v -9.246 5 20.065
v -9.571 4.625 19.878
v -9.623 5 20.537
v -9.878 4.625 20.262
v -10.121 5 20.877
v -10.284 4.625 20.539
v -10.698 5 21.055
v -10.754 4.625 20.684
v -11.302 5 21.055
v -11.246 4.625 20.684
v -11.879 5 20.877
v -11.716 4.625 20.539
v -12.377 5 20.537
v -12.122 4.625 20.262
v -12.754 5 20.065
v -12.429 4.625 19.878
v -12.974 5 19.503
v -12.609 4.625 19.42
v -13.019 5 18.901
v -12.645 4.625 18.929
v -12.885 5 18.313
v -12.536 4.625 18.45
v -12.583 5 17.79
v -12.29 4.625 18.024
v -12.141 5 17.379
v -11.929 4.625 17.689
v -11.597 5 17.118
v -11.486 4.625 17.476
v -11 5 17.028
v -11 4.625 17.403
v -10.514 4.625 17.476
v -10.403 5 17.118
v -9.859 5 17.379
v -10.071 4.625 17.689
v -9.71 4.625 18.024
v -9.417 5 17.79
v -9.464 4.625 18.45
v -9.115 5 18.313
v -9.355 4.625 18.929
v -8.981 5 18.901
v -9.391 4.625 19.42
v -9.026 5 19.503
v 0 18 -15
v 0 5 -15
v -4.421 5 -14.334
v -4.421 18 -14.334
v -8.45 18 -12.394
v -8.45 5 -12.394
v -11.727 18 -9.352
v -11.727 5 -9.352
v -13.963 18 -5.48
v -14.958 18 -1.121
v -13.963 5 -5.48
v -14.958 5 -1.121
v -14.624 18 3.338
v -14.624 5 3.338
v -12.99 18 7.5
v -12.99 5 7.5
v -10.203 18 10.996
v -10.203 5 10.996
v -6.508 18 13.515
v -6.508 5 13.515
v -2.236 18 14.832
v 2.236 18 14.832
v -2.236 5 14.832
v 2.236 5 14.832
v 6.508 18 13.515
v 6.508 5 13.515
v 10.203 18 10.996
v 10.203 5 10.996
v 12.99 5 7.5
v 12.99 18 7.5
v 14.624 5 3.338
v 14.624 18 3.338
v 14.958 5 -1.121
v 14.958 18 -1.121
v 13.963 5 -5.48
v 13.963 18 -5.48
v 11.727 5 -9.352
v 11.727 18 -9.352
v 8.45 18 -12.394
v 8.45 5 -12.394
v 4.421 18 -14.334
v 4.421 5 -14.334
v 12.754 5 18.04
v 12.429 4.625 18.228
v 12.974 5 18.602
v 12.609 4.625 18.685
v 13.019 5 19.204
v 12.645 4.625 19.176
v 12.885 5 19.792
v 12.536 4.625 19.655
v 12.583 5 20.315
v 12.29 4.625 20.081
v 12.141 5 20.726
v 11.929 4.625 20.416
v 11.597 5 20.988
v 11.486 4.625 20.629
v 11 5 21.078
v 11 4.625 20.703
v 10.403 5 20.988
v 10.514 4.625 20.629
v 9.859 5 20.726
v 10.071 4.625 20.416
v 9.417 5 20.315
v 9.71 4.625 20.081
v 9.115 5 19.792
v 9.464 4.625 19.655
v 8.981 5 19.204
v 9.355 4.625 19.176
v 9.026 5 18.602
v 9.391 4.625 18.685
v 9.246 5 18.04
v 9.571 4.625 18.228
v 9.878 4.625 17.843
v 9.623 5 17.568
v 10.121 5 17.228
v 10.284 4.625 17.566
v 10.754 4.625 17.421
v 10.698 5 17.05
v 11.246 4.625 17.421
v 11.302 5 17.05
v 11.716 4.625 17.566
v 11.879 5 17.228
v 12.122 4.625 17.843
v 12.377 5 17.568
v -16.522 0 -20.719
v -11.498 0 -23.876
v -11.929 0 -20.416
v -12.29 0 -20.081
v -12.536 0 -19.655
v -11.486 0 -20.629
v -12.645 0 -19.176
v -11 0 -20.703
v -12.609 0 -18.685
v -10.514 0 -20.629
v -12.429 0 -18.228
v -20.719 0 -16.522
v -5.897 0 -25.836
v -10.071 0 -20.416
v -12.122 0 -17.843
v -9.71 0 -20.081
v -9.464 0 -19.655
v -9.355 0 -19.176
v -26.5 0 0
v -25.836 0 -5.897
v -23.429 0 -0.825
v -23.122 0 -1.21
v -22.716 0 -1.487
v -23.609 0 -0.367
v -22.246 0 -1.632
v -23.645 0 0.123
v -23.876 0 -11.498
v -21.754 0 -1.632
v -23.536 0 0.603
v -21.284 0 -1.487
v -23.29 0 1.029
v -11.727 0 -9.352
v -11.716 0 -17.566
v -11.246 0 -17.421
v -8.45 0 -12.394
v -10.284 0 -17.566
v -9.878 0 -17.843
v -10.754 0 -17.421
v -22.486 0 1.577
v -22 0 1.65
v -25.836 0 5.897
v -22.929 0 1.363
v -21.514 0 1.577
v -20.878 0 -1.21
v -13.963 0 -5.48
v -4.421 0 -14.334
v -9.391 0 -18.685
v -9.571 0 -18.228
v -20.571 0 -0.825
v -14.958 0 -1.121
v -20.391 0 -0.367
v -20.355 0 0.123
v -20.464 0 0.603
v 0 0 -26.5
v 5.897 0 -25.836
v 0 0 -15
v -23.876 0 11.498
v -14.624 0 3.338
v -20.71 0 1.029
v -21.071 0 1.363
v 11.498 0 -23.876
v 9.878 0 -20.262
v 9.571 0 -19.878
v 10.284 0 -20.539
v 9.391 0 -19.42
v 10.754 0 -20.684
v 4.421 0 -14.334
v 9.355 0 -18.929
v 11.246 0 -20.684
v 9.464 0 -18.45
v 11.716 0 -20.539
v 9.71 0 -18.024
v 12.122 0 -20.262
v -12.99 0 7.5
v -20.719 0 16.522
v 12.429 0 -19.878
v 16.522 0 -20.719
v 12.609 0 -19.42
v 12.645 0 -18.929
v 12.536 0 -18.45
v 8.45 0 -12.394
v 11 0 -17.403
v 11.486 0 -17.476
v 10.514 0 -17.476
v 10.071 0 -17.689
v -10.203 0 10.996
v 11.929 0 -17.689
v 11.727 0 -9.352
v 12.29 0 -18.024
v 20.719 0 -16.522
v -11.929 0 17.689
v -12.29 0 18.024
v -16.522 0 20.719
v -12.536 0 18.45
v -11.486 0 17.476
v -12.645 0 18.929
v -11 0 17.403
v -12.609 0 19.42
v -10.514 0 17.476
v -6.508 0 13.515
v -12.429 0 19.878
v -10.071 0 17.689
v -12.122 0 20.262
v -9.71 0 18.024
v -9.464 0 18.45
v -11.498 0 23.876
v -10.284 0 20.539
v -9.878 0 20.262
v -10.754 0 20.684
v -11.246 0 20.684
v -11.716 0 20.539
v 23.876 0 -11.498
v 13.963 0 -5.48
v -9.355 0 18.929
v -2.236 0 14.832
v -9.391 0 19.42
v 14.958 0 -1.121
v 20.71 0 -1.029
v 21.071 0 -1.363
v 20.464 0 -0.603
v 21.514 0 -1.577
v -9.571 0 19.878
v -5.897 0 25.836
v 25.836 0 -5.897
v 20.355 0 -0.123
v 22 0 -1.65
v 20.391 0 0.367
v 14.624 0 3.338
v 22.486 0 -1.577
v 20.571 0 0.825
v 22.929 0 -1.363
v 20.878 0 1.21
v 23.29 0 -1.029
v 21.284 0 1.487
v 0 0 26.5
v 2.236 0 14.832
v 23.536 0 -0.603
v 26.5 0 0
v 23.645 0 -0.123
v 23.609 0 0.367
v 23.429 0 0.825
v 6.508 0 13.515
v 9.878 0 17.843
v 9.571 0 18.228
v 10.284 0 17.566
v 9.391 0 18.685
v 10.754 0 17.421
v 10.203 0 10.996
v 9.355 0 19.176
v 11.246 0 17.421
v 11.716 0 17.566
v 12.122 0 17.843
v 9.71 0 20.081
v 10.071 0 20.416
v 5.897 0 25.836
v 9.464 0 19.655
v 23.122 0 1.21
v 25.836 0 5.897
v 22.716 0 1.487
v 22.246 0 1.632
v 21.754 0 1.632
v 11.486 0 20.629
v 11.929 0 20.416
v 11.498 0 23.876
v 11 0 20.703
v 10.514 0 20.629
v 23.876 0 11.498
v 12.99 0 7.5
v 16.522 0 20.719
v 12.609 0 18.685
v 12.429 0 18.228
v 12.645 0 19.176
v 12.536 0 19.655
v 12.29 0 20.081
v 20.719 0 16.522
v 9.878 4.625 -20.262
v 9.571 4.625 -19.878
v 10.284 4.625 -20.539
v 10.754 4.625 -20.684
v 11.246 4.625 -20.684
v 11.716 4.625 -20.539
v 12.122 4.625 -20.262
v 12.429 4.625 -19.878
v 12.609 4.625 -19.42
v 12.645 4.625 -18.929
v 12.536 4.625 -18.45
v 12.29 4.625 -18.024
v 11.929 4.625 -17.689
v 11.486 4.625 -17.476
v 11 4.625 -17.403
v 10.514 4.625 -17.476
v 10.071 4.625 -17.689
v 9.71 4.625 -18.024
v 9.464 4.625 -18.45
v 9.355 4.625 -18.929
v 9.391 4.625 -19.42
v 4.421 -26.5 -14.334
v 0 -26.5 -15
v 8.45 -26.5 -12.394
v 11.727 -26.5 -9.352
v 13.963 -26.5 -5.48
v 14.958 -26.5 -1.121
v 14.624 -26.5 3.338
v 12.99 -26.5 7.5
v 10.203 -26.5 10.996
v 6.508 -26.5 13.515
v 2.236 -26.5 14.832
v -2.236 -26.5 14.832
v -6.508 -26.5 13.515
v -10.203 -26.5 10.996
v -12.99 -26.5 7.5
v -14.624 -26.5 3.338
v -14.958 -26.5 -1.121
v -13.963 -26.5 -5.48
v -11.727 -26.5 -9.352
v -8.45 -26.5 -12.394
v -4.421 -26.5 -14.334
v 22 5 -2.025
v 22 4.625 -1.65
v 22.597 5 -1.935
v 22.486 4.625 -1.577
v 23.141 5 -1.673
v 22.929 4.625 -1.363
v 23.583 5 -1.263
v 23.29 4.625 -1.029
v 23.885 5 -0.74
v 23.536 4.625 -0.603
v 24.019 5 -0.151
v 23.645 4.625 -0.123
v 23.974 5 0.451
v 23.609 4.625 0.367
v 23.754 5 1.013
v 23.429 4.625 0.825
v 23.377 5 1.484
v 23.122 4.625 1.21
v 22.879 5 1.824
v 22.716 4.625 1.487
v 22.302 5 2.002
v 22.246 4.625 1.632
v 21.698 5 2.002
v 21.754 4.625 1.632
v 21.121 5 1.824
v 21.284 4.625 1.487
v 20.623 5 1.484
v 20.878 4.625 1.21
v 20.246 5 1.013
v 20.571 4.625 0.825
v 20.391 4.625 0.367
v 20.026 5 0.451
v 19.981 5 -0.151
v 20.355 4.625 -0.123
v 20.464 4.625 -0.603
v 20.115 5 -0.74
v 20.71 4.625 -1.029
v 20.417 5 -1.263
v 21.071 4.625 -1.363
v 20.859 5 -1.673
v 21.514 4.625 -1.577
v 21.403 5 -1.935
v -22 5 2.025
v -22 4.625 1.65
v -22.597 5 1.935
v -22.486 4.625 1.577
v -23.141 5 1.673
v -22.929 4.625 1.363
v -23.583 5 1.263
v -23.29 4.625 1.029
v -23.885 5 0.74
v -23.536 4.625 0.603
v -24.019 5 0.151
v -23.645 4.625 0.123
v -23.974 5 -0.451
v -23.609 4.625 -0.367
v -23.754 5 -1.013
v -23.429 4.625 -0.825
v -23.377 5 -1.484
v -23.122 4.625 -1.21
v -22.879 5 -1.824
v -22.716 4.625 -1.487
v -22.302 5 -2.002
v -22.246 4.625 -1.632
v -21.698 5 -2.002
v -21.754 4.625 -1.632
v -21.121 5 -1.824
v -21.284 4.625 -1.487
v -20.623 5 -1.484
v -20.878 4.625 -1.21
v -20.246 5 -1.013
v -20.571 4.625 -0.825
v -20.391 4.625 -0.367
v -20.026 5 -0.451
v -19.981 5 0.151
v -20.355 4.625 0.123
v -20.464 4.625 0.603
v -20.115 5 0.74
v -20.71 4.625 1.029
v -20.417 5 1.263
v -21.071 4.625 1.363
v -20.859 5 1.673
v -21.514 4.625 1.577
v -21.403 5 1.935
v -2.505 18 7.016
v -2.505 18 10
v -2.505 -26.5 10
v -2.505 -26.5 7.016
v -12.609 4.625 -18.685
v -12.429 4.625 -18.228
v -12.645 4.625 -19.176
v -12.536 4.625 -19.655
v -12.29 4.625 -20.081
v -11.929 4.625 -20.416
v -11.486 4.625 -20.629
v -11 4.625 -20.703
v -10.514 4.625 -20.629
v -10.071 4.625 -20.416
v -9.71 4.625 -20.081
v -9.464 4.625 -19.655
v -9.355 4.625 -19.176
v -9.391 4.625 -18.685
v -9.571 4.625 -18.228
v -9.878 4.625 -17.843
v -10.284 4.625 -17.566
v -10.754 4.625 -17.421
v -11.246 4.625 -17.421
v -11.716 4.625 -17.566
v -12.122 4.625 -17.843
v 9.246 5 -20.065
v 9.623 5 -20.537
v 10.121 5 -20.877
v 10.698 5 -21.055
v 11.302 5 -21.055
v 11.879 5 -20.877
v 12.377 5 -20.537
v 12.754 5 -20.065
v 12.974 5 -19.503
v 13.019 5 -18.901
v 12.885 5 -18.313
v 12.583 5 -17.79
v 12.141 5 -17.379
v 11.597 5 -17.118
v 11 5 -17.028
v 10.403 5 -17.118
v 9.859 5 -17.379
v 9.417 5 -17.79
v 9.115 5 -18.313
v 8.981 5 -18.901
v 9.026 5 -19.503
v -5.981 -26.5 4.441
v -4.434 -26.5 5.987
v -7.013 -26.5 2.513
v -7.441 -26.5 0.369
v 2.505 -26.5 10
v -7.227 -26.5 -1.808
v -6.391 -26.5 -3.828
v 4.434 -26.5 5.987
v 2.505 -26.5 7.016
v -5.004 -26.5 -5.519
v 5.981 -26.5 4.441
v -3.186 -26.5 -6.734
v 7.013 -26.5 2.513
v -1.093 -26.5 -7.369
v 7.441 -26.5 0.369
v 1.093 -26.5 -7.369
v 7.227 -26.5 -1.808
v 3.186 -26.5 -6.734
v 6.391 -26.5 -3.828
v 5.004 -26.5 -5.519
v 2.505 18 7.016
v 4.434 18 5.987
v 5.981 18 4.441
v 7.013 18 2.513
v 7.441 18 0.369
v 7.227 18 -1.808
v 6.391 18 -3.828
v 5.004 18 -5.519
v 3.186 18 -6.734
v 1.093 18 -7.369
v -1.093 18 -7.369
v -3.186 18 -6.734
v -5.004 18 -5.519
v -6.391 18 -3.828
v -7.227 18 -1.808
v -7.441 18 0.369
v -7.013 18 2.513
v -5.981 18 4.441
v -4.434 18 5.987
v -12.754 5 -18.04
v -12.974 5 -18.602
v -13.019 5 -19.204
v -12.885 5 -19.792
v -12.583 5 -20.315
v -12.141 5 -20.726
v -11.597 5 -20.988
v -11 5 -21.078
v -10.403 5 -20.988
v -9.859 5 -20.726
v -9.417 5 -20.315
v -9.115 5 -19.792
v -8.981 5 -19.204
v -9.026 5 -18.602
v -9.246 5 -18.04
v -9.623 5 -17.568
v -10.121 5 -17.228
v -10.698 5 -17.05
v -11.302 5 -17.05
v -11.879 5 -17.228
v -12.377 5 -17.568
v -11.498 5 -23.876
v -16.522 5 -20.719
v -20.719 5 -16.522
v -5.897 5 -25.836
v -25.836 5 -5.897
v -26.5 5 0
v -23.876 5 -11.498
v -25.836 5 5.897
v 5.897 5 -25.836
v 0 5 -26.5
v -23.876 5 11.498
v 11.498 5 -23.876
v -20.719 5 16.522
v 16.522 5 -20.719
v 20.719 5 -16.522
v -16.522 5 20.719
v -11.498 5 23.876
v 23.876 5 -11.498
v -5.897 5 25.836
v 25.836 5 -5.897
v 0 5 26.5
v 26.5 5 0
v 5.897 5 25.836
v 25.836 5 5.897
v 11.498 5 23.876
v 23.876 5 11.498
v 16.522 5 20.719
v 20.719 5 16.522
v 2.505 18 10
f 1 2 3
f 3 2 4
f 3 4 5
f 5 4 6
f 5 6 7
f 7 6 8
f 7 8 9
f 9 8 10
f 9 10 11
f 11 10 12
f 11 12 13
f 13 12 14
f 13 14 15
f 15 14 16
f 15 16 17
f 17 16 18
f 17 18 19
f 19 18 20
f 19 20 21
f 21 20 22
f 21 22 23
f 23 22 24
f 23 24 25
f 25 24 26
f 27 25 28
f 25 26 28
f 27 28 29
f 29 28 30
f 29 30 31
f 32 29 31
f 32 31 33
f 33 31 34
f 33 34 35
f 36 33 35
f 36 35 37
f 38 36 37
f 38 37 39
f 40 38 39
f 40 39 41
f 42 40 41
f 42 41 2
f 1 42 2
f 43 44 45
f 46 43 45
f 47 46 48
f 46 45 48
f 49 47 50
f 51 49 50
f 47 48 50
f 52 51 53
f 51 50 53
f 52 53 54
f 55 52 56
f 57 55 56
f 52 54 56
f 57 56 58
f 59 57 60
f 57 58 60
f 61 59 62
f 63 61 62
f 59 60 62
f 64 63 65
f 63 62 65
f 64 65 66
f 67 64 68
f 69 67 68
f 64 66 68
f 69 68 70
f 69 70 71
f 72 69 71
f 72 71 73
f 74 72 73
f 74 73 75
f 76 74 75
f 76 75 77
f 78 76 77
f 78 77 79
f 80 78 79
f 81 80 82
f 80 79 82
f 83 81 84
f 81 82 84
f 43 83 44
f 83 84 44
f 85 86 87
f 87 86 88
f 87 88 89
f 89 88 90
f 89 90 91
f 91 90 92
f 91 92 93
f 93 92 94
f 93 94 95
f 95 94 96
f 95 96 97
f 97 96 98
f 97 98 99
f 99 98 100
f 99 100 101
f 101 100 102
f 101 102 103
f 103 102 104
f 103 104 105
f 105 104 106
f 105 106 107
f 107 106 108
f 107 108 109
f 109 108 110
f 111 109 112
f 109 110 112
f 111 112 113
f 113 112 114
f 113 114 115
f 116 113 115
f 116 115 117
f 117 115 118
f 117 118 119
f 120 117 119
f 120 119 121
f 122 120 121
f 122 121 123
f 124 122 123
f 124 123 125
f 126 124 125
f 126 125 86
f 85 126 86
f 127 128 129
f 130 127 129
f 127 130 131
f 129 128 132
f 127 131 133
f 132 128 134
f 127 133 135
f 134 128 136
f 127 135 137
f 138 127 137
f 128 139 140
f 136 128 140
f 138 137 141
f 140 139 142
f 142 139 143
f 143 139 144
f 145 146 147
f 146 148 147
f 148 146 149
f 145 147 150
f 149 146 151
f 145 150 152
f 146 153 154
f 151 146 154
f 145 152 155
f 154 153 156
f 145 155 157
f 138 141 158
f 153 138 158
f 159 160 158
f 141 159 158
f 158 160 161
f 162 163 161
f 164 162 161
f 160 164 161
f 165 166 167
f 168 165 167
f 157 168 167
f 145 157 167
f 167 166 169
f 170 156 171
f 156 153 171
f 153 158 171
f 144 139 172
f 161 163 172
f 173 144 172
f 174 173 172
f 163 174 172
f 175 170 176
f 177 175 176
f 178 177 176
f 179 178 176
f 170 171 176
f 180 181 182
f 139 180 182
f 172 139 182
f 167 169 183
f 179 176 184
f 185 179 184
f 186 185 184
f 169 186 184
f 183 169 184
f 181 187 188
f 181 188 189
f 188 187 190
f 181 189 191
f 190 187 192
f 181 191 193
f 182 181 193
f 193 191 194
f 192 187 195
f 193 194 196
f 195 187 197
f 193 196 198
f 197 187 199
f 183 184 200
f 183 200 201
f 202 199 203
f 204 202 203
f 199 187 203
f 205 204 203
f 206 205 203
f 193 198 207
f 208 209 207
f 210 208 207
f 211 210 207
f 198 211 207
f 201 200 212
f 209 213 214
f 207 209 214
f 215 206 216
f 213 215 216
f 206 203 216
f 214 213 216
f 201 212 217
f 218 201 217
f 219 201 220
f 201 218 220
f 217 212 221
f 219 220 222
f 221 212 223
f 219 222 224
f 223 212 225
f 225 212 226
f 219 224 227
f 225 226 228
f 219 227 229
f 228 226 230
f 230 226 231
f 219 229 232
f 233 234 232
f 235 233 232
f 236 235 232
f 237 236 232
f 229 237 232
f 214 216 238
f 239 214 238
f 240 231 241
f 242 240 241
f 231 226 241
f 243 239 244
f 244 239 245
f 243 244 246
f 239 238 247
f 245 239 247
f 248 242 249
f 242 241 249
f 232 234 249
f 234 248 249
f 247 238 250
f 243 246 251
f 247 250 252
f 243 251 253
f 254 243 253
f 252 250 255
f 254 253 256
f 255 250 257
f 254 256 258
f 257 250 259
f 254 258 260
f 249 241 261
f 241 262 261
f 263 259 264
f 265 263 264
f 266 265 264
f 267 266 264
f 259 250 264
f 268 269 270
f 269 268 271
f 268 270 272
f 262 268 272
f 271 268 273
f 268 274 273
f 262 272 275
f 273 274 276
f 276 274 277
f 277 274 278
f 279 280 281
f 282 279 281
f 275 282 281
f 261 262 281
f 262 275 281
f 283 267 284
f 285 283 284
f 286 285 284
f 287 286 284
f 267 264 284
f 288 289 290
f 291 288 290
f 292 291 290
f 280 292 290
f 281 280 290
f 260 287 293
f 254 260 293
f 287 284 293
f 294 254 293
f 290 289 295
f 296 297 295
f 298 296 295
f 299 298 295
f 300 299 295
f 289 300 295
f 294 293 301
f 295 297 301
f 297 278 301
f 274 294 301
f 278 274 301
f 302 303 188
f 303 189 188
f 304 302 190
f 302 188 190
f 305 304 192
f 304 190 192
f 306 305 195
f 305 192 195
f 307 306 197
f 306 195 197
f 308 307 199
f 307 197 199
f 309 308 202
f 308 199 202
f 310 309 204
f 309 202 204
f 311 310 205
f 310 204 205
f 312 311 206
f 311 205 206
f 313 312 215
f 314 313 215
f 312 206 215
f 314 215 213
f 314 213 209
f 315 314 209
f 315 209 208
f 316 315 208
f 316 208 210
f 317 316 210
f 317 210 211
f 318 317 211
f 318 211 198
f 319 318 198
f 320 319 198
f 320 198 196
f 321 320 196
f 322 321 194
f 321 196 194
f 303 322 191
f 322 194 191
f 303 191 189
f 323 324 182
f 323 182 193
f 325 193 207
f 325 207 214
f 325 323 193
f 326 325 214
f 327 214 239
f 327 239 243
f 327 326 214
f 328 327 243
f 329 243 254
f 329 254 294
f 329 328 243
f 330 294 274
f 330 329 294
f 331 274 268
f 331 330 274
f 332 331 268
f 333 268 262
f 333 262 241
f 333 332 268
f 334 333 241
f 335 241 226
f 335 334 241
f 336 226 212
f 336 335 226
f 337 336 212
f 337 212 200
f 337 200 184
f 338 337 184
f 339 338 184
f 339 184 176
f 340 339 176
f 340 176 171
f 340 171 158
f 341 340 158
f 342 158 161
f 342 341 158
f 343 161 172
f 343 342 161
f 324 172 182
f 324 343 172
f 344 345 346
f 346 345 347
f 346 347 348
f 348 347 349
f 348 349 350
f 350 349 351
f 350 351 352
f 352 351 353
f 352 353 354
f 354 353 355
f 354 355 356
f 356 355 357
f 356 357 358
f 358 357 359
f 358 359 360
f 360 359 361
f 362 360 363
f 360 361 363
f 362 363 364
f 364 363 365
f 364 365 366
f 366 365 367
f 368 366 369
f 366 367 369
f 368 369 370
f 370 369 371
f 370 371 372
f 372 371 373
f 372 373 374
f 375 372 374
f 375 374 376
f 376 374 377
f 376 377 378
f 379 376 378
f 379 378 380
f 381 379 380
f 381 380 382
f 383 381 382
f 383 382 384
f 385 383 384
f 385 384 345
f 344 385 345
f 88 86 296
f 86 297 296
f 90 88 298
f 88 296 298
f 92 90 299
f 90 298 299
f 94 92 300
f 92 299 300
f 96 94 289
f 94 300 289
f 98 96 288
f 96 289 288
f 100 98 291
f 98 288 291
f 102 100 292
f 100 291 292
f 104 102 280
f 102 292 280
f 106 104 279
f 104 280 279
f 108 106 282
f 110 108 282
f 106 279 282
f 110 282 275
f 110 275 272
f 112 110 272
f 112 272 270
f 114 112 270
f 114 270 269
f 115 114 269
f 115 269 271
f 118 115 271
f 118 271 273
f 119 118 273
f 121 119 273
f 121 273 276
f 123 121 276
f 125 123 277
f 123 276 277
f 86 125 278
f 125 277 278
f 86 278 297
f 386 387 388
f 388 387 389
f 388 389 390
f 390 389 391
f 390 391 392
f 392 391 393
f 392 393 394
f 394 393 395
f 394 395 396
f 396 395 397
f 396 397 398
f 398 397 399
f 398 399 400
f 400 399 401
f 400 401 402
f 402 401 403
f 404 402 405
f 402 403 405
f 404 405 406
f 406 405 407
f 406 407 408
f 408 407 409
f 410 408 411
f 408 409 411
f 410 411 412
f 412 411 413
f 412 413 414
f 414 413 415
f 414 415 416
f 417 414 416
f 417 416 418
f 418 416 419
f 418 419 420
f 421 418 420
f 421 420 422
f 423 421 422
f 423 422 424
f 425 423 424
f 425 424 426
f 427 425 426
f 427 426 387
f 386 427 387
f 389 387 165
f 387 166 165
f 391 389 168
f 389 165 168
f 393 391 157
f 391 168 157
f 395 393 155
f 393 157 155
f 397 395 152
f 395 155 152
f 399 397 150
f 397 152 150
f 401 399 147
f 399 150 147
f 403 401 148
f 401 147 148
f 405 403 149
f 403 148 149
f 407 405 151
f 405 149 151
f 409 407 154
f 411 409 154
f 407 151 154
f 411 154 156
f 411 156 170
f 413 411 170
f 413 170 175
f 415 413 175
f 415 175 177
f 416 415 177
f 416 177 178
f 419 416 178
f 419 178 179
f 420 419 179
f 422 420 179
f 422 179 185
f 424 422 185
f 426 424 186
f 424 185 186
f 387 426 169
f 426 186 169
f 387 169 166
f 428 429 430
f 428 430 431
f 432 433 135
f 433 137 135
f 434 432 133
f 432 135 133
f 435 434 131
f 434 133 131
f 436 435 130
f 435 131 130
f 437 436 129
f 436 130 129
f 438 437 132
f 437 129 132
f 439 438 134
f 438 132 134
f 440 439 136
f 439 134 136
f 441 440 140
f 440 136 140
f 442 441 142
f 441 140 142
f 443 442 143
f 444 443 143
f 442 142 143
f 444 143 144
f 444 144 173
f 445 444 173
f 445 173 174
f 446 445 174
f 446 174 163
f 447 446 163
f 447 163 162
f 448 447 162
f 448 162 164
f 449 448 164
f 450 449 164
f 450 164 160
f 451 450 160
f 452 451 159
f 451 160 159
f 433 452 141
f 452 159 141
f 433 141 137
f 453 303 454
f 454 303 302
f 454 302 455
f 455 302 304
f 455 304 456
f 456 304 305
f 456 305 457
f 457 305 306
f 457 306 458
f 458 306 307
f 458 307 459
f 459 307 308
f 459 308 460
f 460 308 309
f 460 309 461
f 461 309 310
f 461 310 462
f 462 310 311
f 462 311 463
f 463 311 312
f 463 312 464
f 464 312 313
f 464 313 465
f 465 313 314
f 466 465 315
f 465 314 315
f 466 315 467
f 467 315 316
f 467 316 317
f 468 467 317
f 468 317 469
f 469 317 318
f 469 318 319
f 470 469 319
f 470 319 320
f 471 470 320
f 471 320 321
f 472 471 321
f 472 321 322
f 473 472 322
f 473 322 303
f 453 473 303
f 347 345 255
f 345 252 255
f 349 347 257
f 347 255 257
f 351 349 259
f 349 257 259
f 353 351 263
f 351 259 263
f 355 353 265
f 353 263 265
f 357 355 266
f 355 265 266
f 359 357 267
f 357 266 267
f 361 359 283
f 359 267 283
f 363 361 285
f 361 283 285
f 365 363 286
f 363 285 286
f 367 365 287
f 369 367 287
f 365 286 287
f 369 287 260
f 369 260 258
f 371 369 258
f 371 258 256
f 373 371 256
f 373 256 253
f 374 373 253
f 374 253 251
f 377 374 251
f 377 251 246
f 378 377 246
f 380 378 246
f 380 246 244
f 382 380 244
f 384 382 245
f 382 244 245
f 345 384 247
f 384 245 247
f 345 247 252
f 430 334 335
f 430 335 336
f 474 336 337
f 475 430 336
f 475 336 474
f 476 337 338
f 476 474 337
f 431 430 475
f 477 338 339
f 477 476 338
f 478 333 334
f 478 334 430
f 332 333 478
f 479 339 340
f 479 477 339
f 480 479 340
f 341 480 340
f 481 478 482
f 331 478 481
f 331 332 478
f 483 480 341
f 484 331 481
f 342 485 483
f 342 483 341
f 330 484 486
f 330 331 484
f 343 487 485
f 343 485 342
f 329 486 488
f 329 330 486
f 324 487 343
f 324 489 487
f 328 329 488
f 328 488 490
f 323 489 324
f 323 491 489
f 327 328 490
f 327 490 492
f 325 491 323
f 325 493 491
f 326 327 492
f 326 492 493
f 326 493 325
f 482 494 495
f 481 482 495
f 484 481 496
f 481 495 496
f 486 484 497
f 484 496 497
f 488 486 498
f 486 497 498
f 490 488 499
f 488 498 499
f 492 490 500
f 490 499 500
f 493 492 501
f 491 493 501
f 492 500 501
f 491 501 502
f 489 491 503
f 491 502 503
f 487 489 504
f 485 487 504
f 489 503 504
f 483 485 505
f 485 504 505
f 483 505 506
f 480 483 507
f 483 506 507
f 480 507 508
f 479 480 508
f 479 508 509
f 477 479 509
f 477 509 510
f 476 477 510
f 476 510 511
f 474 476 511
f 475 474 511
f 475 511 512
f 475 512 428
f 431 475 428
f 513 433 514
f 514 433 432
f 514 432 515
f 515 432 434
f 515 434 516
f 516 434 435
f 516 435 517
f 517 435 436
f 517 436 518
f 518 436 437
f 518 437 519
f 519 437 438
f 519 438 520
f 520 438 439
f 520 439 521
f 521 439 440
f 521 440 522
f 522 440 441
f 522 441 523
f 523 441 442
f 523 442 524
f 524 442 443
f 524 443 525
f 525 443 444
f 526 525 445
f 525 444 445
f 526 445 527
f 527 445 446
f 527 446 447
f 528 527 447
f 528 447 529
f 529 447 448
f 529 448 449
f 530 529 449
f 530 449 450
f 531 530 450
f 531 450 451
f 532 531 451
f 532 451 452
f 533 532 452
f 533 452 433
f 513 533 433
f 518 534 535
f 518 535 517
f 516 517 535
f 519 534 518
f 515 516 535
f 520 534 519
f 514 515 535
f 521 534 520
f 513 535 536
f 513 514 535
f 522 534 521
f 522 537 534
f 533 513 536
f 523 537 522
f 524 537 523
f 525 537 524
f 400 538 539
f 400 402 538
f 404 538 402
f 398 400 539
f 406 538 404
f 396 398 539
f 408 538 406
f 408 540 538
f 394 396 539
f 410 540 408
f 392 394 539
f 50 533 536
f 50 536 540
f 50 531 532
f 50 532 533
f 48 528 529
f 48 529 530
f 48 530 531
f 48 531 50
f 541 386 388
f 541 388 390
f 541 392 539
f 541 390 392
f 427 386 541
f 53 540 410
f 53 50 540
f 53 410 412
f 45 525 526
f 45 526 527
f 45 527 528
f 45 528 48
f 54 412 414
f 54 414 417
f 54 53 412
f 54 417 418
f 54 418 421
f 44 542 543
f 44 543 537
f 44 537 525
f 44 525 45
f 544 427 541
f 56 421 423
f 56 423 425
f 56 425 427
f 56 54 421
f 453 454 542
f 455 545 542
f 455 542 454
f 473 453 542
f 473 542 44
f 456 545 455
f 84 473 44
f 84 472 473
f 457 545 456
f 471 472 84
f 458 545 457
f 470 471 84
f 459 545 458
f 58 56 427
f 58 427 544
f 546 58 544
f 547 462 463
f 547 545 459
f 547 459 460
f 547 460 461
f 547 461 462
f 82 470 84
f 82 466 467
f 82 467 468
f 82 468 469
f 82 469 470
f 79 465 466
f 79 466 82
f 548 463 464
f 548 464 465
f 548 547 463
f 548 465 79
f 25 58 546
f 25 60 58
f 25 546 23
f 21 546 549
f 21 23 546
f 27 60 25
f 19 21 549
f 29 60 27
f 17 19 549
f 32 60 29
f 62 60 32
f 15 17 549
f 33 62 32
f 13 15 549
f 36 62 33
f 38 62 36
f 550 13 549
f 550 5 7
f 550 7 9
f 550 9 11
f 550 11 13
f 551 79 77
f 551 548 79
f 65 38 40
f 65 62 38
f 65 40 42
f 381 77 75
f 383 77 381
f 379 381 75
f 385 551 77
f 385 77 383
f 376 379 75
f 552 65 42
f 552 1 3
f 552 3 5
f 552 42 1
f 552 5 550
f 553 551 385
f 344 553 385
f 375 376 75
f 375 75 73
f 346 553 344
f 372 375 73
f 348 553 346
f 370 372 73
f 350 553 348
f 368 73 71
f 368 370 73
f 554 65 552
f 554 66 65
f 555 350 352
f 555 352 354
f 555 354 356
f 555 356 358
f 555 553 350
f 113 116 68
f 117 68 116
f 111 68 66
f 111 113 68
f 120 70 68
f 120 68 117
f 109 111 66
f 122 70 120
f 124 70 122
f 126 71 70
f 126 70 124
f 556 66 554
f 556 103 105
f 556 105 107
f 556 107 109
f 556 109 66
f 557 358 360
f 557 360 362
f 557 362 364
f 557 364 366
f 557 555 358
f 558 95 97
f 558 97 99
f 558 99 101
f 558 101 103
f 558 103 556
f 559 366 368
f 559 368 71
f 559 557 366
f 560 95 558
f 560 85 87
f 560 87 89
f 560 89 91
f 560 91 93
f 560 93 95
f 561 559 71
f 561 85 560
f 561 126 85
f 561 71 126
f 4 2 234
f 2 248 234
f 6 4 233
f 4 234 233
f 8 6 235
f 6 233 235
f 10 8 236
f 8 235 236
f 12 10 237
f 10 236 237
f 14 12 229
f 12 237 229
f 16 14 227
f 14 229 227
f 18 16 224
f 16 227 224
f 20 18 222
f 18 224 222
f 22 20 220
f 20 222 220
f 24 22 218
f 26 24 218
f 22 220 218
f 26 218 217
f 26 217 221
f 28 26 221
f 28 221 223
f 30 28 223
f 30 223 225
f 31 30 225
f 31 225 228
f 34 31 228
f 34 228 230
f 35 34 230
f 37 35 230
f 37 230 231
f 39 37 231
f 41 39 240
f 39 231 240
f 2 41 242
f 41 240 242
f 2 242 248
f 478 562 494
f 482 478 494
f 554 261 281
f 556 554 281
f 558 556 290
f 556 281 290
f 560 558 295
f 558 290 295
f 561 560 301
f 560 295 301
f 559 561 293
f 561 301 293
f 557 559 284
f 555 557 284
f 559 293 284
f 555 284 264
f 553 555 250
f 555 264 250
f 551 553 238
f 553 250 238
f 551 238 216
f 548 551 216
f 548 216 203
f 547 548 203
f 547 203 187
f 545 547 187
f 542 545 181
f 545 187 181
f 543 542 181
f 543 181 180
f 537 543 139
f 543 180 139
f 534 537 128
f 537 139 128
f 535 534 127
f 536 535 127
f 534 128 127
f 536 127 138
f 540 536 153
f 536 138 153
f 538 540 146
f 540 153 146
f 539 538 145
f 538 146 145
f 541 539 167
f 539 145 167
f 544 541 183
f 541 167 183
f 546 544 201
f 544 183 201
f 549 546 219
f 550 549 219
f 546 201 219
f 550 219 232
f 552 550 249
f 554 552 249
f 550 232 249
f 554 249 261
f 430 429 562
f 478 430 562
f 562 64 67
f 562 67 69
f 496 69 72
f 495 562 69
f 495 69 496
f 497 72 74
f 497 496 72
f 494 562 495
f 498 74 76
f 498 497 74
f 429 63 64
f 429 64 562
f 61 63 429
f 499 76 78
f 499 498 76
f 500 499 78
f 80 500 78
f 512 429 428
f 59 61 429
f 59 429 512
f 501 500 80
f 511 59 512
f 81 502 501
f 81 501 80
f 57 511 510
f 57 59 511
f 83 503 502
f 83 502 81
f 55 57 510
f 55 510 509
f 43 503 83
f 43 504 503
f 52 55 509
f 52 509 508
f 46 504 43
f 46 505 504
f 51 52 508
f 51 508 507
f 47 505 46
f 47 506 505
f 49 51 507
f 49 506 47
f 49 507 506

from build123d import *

# Parameters (mm, degrees)
SKETCH_1_R                   = 26.5
EXTRUDE_2_DEPTH              = 5
SKETCH_3_R                   = 15
EXTRUDE_3_DEPTH              = 13
EXTRUDE_START                = 26.5
SKETCH_4_R                   = 15
EXTRUDE_4_DEPTH              = 26.5
HOLE_WIZARD_M4_1_D           = 3.3
HOLE_WIZARD_M4_1_CSINK_D     = 4.05
HOLE_WIZARD_M4_1_CSINK_ANGLE = 90
PATTERN_CIRCULAR_1_COUNT     = 6
SKETCH_7_R                   = 7.45
CUT_EXTRUDE_1_DEPTH          = 44.5
SKETCH_8_W                   = 5.01
SKETCH_8_H                   = 5
CUT_EXTRUDE_2_DEPTH          = 44.5


with BuildPart() as part:
    # 草图1 → 凸台-拉伸2 (new body)
    with BuildSketch(Plane(origin=(0, 0, 0), x_dir=(1, 0, 0), z_dir=(0, 1, 0))):
        with Locations(Location((0, 0, 0), (0, 0, 270))):
            Circle(SKETCH_1_R)
    extrude(amount=EXTRUDE_2_DEPTH)

    # 草图3 → 凸台-拉伸3 (add)
    with BuildSketch(Plane(origin=(0, 5, 0), x_dir=(1, 0, 0), z_dir=(0, 1, 0))):
        with Locations(Location((0, 0, 0), (0, 0, 90))):
            Circle(SKETCH_3_R)
    extrude(amount=EXTRUDE_3_DEPTH)

    # 草图4 → 凸台-拉伸4 (add)
    with BuildSketch(Plane.XZ.offset(EXTRUDE_START)):
        with Locations(Location((0, 0, 0), (0, 0, 270))):
            Circle(SKETCH_4_R)
    extrude(amount=-EXTRUDE_4_DEPTH)

    # M4 螺纹孔1 (through all)
    with Locations(Plane(origin=(22, 5, 0), x_dir=(0, 0, 1), z_dir=(0, 1, 0))):
        with Locations((0, 0)):
            hole_wizard_m4_1 = CounterSinkHole(HOLE_WIZARD_M4_1_D / 2, HOLE_WIZARD_M4_1_CSINK_D / 2, counter_sink_angle=HOLE_WIZARD_M4_1_CSINK_ANGLE)

    # 阵列(圆周)1: M4 螺纹孔1 ×6 about axis
    pattern_circular_1_axis = Axis((0, 0, 0), (0, 1, 0))
    for i in range(1, PATTERN_CIRCULAR_1_COUNT):
        add(hole_wizard_m4_1.rotate(pattern_circular_1_axis, i * 360 / PATTERN_CIRCULAR_1_COUNT), mode=Mode.SUBTRACT)

    # 草图7 → 切除-拉伸1 (cut)
    with BuildSketch(Plane(origin=(0, 18, 0), x_dir=(1, 0, 0), z_dir=(0, 1, 0))):
        with Locations(Location((0, 0, 0), (0, 0, 270))):
            Circle(SKETCH_7_R)
    extrude(amount=-CUT_EXTRUDE_1_DEPTH, mode=Mode.SUBTRACT)

    # 草图8 → 切除-拉伸2 (cut)
    with BuildSketch(Plane(origin=(0, 18, 0), x_dir=(1, 0, 0), z_dir=(0, 1, 0))):
        with Locations((0, -7.5)):
            Rectangle(SKETCH_8_W, SKETCH_8_H)
    extrude(amount=-CUT_EXTRUDE_2_DEPTH, mode=Mode.SUBTRACT)


solid = part.part
